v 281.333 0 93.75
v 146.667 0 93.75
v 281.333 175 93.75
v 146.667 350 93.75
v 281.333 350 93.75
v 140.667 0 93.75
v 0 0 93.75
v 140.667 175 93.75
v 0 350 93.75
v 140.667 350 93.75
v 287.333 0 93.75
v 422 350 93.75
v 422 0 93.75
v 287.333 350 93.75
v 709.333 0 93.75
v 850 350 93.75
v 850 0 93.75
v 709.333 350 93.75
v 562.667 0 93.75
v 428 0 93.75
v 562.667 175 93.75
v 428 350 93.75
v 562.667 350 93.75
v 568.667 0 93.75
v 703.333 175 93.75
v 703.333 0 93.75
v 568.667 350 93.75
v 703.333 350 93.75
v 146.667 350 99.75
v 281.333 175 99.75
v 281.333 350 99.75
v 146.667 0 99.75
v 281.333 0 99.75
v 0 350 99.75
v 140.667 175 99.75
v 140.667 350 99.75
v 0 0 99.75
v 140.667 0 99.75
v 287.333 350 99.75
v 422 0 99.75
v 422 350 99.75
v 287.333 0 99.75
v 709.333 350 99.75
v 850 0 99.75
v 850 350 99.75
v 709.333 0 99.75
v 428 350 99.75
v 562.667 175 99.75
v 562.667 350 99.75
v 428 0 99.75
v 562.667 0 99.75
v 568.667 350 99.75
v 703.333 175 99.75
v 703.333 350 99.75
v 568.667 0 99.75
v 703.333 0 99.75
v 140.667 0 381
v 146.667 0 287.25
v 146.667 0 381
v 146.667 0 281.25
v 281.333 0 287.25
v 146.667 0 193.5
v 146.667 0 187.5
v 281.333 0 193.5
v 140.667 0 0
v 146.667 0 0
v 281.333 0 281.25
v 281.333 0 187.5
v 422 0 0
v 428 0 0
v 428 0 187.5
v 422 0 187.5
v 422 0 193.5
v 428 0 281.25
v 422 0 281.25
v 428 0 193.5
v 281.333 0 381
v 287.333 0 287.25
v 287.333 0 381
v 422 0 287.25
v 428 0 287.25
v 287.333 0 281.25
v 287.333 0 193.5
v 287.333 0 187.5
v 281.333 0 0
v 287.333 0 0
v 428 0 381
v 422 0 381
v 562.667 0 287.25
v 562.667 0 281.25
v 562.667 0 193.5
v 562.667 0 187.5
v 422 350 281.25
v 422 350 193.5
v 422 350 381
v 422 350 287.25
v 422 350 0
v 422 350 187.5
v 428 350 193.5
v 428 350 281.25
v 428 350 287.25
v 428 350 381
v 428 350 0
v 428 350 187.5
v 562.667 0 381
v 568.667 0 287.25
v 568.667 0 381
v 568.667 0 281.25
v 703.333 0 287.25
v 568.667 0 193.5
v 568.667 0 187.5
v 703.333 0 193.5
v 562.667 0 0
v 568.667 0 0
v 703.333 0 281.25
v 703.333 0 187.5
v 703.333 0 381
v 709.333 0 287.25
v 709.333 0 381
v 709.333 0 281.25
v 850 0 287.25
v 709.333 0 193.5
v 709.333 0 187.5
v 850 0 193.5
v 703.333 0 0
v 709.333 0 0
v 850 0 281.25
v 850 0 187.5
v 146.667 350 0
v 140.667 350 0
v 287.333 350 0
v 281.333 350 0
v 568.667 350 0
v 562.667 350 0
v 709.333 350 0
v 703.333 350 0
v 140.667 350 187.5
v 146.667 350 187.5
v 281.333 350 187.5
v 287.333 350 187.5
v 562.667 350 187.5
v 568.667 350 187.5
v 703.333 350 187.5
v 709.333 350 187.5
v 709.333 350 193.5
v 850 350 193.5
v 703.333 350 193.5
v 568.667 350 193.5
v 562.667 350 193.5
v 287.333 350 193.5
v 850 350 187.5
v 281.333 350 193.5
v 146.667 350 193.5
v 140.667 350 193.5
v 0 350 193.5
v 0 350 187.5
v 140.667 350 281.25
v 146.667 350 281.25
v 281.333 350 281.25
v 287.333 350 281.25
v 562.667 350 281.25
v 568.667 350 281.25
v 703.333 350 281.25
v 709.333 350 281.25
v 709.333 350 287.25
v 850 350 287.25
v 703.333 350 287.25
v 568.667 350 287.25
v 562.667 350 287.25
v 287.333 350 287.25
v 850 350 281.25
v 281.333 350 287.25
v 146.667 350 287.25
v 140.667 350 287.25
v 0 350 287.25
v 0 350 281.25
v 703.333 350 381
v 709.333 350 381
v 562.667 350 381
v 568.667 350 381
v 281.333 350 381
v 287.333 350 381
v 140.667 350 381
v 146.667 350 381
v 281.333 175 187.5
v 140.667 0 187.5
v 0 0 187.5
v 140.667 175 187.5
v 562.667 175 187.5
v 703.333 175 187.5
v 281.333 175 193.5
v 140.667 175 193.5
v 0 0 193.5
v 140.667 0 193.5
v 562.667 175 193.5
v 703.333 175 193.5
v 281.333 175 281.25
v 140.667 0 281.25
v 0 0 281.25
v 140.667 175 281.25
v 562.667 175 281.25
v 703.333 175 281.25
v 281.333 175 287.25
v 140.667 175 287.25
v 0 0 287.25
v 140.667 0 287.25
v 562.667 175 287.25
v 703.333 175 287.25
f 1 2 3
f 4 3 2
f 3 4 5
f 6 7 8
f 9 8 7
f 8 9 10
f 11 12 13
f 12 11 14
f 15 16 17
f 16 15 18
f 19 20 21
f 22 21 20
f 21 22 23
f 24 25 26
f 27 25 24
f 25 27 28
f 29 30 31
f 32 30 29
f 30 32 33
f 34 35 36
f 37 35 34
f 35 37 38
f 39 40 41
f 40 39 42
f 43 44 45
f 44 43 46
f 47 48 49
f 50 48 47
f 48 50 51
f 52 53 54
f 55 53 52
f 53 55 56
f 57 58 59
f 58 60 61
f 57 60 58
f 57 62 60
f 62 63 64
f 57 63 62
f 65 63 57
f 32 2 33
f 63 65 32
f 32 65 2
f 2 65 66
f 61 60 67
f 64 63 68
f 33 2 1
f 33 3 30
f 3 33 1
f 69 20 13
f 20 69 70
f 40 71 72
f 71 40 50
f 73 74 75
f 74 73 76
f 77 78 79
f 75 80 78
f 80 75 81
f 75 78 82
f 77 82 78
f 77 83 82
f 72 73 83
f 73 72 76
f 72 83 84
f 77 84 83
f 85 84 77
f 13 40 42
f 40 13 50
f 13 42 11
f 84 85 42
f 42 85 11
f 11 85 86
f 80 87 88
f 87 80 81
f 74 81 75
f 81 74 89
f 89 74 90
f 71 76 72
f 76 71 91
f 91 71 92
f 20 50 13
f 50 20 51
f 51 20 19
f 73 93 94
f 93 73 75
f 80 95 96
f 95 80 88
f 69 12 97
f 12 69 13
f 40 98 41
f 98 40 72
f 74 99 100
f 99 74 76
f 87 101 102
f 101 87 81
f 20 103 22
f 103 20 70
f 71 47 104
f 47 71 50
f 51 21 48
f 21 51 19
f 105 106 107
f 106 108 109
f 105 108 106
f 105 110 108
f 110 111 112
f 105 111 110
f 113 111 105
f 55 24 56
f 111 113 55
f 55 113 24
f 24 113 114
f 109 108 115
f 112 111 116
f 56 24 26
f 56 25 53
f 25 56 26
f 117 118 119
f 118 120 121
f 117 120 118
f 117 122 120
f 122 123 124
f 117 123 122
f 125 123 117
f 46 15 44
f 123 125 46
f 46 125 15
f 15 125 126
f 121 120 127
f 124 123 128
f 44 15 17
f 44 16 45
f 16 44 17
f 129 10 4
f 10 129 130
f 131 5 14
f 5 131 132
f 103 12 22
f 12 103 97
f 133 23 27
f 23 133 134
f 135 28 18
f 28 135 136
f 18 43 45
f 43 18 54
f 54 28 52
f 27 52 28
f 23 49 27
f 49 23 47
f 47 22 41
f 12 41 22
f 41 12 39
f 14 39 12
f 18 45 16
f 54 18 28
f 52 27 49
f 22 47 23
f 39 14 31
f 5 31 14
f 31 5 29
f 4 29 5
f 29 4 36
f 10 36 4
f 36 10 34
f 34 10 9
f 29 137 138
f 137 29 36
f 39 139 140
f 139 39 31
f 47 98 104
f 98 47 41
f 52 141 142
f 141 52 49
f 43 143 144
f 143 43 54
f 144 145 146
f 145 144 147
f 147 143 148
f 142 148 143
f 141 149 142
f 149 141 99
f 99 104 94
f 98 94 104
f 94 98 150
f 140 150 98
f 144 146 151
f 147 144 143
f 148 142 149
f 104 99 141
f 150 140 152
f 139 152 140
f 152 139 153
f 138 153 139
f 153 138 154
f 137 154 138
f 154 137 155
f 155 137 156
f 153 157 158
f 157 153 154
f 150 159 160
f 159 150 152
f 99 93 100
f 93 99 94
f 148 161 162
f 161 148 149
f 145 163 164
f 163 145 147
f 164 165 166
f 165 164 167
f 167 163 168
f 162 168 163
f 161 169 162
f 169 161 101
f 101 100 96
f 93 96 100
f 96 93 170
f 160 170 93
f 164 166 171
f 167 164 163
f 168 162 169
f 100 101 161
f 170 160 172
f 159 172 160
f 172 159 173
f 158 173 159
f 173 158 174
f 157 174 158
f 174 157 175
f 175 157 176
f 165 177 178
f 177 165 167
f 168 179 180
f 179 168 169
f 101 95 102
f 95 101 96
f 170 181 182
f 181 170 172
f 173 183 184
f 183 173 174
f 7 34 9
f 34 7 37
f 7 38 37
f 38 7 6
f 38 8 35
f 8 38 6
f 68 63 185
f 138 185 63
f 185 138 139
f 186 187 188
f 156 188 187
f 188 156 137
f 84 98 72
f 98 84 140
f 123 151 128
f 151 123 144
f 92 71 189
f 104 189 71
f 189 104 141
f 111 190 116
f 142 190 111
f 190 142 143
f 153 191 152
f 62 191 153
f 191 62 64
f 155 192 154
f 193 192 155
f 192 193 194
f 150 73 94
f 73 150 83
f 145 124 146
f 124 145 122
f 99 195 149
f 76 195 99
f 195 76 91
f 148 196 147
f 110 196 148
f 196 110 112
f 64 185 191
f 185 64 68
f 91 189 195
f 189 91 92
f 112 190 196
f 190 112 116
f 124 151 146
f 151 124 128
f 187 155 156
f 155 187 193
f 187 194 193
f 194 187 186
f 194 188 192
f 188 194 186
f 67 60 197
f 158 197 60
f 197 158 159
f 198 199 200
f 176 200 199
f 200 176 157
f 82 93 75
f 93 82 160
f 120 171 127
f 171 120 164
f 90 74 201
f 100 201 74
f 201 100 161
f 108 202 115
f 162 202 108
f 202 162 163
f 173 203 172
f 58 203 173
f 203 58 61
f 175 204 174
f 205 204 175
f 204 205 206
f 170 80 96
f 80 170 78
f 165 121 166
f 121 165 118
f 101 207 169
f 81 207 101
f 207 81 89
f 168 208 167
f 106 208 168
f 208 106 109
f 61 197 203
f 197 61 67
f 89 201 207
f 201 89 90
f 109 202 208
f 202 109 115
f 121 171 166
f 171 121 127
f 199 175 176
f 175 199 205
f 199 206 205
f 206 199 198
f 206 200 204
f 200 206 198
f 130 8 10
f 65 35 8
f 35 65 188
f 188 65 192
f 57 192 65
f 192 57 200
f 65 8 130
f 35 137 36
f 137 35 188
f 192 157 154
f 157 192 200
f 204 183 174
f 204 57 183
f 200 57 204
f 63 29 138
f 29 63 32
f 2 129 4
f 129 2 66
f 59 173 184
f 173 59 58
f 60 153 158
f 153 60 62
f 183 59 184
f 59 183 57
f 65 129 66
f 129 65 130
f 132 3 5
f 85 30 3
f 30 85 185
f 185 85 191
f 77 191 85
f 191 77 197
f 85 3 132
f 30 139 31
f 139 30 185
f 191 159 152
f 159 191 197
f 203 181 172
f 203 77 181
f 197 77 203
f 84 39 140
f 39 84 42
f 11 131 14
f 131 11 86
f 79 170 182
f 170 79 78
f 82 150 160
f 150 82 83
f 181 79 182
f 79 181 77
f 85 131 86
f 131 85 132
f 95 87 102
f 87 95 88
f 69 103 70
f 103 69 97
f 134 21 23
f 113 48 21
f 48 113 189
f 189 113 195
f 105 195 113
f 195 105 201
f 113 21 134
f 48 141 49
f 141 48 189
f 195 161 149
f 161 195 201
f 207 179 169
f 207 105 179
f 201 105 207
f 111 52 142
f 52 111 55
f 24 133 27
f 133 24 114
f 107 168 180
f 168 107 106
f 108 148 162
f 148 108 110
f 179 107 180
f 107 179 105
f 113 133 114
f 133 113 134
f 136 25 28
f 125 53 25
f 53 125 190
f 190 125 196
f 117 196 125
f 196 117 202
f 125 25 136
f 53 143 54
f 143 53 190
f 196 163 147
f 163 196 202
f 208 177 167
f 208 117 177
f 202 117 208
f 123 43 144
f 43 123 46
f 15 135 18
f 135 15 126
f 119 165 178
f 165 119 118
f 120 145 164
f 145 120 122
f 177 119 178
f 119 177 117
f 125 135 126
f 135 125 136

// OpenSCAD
/*Compartments
Simple Script to generate Compartments for a rectangular container.
*/

//Settings
xNr = 4;
yNr = 6;
xD = 381;
yD = 850;
depth = 350;
thickness = 6;
end = 1;
margin = .001;

//Make Planes
module horizontalPlane() {
    linear_extrude(height=thickness)difference() {
        square([yD,depth]);
        for(i=[end:yNr-end])translate([i*(yD-thickness)/yNr,0])square([thickness,depth/2]);
    }
}
module verticalPlane() {
    linear_extrude(height=thickness)translate([xD,depth])rotate(a=[0,0,180])difference() {
        square([xD,depth]);
        for(i=[end:xNr-end])translate([i*(xD-thickness)/xNr,0])square([thickness,depth/2]);
    }
}

//Render
module render() {
    for(i=[end:xNr-end])translate([0,0,i*(xD-thickness)/xNr])horizontalPlane();
    for(i=[end:yNr-end])translate([i*(yD-thickness)/yNr,0,0])translate([0,0,xD])rotate([0,90,0])verticalPlane();
}    
//Export
module export() {
    for(i=[end:yNr-end])translate([yD+margin,i*(depth+margin),0])projection()verticalPlane();
    for(i=[end:xNr-end])translate([0,i*(depth+margin)])projection()horizontalPlane();
}

!render();
export();
